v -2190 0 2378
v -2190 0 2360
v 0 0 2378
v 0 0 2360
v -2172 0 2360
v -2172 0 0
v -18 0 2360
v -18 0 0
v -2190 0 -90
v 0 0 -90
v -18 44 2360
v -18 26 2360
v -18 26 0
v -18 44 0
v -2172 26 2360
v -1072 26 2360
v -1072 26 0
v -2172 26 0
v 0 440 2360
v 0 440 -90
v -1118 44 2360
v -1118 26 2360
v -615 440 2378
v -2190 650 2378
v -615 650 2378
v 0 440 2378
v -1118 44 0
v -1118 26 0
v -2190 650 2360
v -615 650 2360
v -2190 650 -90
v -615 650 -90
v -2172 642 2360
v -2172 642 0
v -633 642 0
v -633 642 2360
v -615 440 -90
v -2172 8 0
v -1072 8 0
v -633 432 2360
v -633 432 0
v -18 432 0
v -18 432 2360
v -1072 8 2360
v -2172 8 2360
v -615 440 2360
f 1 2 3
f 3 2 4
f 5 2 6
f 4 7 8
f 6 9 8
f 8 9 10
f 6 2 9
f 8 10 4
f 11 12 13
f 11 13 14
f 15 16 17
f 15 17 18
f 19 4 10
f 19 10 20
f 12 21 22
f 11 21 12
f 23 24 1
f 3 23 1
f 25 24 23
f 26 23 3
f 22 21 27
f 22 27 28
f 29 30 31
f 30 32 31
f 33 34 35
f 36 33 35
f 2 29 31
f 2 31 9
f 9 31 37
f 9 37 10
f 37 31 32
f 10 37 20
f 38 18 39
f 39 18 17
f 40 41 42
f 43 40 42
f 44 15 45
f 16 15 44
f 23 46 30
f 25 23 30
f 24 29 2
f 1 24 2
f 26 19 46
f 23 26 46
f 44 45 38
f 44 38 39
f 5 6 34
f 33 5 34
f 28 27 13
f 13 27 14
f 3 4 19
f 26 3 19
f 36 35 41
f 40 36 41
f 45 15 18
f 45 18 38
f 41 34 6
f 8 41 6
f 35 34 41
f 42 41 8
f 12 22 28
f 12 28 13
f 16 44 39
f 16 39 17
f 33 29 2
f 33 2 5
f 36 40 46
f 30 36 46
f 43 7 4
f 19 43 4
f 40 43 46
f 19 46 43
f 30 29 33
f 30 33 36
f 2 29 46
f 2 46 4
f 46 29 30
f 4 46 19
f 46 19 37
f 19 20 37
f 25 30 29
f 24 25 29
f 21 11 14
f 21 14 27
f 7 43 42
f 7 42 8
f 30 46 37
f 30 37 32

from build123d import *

# Parameters (mm, degrees)
F1_DEPTH = 90
F2_DEPTH = 2360
F3_DEPTH = 2360
F4_DEPTH = 2360
F6_DEPTH = 18


with BuildPart() as f1:
    # F0 (on Top) → F1 (new body)
    with BuildSketch(Plane.XY):
        Polygon((-623, 440), (-615, 440), (-615, 650), (-624, 650), (-625, 650), (-625, 642), (-633, 642), (-633, 432), (-623, 432), align=None)
        Polygon((-10, 432), (-10, 440), (-18, 440), (-615, 440), (-623, 440), (-623, 432), (-615, 432), (-18, 432), align=None)
        Polygon((-2172, 650), (-2180, 650), (-2180, 642), (-2172, 642), (-633, 642), (-625, 642), (-625, 650), (-633, 650), (-2171.212093, 650), align=None)
        Polygon((-18, 0), (0, 0), (0, 440), (-10, 440), (-10, 432), (-18, 432), (-18, 44), (-18, 26), align=None)
        Polygon((-1118, 44), (-18, 44), (-18, 432), (-615, 432), (-623, 432), (-633, 432), (-633, 642), (-2172, 642), (-2172, 26), (-1118, 26), align=None)
        Polygon((-1072, 26), (-18, 26), (-18, 44), (-1118, 44), (-1118, 26), align=None)
        Polygon((-2172, 26), (-2172, 8), (-1072, 8), (-1072, 26), (-1118, 26), align=None)
        Polygon((-2172, 0), (-18, 0), (-18, 26), (-1072, 26), (-1072, 8), (-2172, 8), align=None)
        Polygon((-2190, 0), (-2172, 0), (-2172, 8), (-2172, 26), (-2172, 642), (-2180, 642), (-2180, 650), (-2190, 650), align=None)
    extrude(amount=-F1_DEPTH)

    # F0 (on Top) → F2 (join)
    with BuildSketch(Plane.XY):
        Polygon((-2172, 650), (-2180, 650), (-2180, 642), (-2172, 642), (-633, 642), (-625, 642), (-625, 650), (-633, 650), (-2171.212093, 650), align=None)
        Polygon((-623, 440), (-615, 440), (-615, 650), (-624, 650), (-625, 650), (-625, 642), (-633, 642), (-633, 432), (-623, 432), align=None)
        Polygon((-10, 432), (-10, 440), (-18, 440), (-615, 440), (-623, 440), (-623, 432), (-615, 432), (-18, 432), align=None)
        Polygon((-18, 0), (0, 0), (0, 440), (-10, 440), (-10, 432), (-18, 432), (-18, 44), (-18, 26), align=None)
        Polygon((-2190, 0), (-2172, 0), (-2172, 8), (-2172, 26), (-2172, 642), (-2180, 642), (-2180, 650), (-2190, 650), align=None)
    extrude(amount=F2_DEPTH)


with BuildPart() as f3:
    # F0 (on Top) → F3 (new body)
    with BuildSketch(Plane.XY):
        Polygon((-2172, 26), (-2172, 8), (-1072, 8), (-1072, 26), (-1118, 26), align=None)
    extrude(amount=F3_DEPTH)


with BuildPart() as f4:
    # F0 (on Top) → F4 (new body)
    with BuildSketch(Plane.XY):
        Polygon((-1072, 26), (-18, 26), (-18, 44), (-1118, 44), (-1118, 26), align=None)
    extrude(amount=F4_DEPTH)


with BuildPart() as f6:
    # F5 (on face) → F6 (new body)
    with BuildSketch(Plane.XY.offset(2360)):
        Polygon((-615, 440), (-615, 650), (-2190, 650), (-2190, 0), (-2172, 0), (-2172, 642), (-633, 642), (-633, 432), (-18, 432), (-18, 0), (0, 0), (0, 440), align=None)
        Polygon((-2172, 642), (-2172, 0), (-18, 0), (-18, 432), (-633, 432), (-633, 642), align=None)
    extrude(amount=F6_DEPTH)


solid = Compound([f1.part, f3.part, f4.part, f6.part])
